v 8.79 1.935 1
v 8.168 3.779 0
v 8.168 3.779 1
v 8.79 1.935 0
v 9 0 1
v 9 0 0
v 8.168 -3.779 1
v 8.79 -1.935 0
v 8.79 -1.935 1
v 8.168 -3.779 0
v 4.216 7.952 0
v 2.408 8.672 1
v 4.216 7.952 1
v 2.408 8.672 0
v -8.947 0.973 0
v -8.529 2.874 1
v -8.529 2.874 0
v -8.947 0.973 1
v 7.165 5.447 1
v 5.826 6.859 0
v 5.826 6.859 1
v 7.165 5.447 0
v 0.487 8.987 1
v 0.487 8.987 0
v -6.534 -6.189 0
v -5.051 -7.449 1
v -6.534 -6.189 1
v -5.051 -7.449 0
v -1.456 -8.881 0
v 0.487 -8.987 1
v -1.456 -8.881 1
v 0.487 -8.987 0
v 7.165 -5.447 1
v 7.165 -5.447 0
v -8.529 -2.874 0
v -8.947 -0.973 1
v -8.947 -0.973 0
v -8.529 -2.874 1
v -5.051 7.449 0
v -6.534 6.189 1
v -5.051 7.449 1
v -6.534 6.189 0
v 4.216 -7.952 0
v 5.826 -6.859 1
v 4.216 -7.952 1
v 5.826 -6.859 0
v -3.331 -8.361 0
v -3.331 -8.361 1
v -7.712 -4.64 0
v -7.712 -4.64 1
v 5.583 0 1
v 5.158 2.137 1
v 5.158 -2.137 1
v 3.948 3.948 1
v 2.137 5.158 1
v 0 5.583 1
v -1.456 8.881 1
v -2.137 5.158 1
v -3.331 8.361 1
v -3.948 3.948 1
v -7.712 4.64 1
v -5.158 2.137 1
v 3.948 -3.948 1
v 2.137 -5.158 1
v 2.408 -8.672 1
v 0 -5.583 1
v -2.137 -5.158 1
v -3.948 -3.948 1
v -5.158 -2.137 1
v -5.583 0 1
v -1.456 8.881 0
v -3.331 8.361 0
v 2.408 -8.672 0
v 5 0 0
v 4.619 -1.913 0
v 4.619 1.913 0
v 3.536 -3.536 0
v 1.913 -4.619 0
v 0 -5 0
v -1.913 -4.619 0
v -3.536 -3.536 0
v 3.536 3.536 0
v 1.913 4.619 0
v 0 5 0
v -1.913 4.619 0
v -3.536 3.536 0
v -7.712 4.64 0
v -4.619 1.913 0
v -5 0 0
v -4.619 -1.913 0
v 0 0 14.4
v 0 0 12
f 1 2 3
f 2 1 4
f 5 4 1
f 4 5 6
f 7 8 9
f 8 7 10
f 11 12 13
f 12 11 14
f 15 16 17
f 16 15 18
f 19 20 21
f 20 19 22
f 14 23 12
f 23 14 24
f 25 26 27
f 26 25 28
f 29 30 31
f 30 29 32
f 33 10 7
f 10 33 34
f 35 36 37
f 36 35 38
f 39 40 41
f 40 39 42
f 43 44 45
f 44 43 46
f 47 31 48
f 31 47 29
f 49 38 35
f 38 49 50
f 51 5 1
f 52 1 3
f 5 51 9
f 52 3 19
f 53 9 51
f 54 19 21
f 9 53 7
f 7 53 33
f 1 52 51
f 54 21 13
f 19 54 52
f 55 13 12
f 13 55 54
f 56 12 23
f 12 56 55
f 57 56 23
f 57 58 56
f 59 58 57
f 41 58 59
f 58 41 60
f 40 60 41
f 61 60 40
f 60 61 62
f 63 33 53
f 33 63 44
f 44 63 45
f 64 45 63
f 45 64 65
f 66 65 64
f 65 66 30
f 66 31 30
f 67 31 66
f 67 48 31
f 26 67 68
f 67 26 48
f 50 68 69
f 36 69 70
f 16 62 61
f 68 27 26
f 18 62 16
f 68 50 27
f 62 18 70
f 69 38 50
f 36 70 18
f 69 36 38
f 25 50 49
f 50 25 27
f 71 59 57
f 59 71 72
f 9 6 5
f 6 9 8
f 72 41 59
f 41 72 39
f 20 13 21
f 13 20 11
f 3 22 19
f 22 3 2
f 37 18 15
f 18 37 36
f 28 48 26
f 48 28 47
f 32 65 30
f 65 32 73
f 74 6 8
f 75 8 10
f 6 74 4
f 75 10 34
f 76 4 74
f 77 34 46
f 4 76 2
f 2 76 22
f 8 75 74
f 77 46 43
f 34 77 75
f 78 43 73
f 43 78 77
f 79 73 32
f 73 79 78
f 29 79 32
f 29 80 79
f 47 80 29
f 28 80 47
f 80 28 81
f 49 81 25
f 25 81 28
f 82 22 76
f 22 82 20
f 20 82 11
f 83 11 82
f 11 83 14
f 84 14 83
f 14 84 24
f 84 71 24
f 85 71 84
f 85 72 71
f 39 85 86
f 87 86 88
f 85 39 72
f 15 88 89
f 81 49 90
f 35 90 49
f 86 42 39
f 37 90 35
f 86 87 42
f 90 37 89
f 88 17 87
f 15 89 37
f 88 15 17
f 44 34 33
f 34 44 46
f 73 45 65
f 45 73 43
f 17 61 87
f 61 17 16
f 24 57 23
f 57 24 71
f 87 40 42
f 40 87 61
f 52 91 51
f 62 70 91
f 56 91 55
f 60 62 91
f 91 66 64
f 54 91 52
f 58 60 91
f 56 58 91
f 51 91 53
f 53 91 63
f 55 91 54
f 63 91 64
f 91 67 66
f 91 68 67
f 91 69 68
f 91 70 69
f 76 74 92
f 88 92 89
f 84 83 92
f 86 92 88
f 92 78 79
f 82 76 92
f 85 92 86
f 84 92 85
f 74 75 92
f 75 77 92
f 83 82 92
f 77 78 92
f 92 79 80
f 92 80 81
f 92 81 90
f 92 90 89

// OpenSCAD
Height = 14.4;
Cone_Radius = 6;
Brim_Radius=9;
Brim_Thickness=1;
Hole_Radius=5;

difference()
{
	union()
	{
	translate([0,0,0]) scale([1,1,Brim_Thickness]) cylinder(r=Brim_Radius);
	translate([0,0,0]) scale([1.2,1.2,1.2]) cylinder(r1=Cone_Radius/1.2, r2=0, h=Height/1.2);
	}
	union()
	{
	translate([0,0,0]) scale([1,1,1]) cylinder(r1=Hole_Radius, r2=0, h=Height/1.2);
	}
}
